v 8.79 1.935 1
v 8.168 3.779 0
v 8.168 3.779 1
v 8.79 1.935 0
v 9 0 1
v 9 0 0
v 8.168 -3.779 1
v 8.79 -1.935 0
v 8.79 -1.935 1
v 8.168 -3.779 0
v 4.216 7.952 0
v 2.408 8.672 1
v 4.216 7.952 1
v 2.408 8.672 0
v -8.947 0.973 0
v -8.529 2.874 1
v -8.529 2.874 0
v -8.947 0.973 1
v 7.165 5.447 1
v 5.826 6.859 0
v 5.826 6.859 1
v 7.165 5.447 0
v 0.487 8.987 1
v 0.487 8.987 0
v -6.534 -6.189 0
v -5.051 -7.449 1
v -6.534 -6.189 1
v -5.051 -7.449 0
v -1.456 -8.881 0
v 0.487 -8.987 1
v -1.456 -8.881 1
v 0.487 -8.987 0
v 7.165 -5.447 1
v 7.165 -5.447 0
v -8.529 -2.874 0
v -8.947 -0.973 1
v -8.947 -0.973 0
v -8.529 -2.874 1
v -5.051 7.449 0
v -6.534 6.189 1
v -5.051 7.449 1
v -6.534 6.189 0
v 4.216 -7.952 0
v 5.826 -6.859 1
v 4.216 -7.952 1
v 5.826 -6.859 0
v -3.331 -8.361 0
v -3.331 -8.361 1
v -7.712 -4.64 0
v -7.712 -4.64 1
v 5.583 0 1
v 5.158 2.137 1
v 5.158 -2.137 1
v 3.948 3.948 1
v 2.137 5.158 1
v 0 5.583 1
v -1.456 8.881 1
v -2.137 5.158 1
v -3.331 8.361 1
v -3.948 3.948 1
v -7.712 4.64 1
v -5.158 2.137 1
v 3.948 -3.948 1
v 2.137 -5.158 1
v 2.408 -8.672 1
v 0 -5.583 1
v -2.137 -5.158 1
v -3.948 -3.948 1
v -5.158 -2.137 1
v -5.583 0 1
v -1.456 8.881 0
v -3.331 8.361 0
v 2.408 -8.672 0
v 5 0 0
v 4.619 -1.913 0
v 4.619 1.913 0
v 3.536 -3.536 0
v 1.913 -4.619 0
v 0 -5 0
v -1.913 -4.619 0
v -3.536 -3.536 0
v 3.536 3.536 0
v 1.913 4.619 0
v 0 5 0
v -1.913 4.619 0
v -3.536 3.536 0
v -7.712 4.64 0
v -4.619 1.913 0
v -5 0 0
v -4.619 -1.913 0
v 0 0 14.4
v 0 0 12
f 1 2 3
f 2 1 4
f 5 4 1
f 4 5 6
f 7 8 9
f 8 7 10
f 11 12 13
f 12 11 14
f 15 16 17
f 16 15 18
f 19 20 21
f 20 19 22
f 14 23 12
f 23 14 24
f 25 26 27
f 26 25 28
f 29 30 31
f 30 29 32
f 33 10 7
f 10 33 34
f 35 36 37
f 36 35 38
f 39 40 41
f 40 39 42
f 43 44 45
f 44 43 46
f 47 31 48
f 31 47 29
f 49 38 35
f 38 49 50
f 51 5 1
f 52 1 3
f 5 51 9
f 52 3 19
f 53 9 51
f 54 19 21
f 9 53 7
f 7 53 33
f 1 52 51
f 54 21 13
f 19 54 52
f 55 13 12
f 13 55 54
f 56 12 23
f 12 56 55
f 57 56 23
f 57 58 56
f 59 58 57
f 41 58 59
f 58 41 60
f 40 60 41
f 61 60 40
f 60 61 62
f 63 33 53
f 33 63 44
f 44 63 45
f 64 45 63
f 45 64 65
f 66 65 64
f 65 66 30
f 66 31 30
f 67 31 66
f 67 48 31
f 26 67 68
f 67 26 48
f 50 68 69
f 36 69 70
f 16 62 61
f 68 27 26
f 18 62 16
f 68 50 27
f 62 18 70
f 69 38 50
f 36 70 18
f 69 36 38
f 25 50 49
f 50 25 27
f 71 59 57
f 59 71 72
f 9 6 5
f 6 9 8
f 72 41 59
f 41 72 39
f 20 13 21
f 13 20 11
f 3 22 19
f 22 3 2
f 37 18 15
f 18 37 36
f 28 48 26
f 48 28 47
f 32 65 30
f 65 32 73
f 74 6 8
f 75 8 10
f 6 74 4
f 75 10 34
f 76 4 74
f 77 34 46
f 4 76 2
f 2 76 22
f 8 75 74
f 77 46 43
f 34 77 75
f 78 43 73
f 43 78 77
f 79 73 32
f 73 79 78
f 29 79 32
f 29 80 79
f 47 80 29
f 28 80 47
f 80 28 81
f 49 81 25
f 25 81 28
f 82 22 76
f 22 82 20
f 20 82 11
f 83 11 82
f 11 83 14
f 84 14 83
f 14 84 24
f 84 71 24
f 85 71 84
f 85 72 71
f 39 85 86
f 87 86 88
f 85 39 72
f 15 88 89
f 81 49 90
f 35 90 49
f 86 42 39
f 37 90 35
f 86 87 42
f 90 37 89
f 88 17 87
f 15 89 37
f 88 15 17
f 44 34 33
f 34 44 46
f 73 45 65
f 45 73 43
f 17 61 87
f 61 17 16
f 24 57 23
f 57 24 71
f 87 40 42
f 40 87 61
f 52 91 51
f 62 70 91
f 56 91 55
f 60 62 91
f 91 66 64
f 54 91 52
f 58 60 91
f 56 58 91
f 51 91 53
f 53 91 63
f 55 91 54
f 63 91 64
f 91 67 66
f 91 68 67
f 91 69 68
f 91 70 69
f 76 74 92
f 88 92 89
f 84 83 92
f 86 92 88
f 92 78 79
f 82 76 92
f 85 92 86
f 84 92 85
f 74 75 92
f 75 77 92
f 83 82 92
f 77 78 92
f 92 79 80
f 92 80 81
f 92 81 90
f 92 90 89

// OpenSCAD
Height = 14.4;
Cone_Radius = 6;
Brim_Radius=9;
Brim_Thickness=1;
Hole_Radius=5;

difference()
{
	union()
	{
	translate([0,0,0]) scale([1,1,Brim_Thickness]) cylinder(r=Brim_Radius);
	translate([0,0,0]) scale([1.2,1.2,1.2]) cylinder(r1=Cone_Radius/1.2, r2=0, h=Height/1.2);
	}
	union()
	{
	translate([0,0,0]) scale([1,1,1]) cylinder(r1=Hole_Radius, r2=0, h=Height/1.2);
	}
}
